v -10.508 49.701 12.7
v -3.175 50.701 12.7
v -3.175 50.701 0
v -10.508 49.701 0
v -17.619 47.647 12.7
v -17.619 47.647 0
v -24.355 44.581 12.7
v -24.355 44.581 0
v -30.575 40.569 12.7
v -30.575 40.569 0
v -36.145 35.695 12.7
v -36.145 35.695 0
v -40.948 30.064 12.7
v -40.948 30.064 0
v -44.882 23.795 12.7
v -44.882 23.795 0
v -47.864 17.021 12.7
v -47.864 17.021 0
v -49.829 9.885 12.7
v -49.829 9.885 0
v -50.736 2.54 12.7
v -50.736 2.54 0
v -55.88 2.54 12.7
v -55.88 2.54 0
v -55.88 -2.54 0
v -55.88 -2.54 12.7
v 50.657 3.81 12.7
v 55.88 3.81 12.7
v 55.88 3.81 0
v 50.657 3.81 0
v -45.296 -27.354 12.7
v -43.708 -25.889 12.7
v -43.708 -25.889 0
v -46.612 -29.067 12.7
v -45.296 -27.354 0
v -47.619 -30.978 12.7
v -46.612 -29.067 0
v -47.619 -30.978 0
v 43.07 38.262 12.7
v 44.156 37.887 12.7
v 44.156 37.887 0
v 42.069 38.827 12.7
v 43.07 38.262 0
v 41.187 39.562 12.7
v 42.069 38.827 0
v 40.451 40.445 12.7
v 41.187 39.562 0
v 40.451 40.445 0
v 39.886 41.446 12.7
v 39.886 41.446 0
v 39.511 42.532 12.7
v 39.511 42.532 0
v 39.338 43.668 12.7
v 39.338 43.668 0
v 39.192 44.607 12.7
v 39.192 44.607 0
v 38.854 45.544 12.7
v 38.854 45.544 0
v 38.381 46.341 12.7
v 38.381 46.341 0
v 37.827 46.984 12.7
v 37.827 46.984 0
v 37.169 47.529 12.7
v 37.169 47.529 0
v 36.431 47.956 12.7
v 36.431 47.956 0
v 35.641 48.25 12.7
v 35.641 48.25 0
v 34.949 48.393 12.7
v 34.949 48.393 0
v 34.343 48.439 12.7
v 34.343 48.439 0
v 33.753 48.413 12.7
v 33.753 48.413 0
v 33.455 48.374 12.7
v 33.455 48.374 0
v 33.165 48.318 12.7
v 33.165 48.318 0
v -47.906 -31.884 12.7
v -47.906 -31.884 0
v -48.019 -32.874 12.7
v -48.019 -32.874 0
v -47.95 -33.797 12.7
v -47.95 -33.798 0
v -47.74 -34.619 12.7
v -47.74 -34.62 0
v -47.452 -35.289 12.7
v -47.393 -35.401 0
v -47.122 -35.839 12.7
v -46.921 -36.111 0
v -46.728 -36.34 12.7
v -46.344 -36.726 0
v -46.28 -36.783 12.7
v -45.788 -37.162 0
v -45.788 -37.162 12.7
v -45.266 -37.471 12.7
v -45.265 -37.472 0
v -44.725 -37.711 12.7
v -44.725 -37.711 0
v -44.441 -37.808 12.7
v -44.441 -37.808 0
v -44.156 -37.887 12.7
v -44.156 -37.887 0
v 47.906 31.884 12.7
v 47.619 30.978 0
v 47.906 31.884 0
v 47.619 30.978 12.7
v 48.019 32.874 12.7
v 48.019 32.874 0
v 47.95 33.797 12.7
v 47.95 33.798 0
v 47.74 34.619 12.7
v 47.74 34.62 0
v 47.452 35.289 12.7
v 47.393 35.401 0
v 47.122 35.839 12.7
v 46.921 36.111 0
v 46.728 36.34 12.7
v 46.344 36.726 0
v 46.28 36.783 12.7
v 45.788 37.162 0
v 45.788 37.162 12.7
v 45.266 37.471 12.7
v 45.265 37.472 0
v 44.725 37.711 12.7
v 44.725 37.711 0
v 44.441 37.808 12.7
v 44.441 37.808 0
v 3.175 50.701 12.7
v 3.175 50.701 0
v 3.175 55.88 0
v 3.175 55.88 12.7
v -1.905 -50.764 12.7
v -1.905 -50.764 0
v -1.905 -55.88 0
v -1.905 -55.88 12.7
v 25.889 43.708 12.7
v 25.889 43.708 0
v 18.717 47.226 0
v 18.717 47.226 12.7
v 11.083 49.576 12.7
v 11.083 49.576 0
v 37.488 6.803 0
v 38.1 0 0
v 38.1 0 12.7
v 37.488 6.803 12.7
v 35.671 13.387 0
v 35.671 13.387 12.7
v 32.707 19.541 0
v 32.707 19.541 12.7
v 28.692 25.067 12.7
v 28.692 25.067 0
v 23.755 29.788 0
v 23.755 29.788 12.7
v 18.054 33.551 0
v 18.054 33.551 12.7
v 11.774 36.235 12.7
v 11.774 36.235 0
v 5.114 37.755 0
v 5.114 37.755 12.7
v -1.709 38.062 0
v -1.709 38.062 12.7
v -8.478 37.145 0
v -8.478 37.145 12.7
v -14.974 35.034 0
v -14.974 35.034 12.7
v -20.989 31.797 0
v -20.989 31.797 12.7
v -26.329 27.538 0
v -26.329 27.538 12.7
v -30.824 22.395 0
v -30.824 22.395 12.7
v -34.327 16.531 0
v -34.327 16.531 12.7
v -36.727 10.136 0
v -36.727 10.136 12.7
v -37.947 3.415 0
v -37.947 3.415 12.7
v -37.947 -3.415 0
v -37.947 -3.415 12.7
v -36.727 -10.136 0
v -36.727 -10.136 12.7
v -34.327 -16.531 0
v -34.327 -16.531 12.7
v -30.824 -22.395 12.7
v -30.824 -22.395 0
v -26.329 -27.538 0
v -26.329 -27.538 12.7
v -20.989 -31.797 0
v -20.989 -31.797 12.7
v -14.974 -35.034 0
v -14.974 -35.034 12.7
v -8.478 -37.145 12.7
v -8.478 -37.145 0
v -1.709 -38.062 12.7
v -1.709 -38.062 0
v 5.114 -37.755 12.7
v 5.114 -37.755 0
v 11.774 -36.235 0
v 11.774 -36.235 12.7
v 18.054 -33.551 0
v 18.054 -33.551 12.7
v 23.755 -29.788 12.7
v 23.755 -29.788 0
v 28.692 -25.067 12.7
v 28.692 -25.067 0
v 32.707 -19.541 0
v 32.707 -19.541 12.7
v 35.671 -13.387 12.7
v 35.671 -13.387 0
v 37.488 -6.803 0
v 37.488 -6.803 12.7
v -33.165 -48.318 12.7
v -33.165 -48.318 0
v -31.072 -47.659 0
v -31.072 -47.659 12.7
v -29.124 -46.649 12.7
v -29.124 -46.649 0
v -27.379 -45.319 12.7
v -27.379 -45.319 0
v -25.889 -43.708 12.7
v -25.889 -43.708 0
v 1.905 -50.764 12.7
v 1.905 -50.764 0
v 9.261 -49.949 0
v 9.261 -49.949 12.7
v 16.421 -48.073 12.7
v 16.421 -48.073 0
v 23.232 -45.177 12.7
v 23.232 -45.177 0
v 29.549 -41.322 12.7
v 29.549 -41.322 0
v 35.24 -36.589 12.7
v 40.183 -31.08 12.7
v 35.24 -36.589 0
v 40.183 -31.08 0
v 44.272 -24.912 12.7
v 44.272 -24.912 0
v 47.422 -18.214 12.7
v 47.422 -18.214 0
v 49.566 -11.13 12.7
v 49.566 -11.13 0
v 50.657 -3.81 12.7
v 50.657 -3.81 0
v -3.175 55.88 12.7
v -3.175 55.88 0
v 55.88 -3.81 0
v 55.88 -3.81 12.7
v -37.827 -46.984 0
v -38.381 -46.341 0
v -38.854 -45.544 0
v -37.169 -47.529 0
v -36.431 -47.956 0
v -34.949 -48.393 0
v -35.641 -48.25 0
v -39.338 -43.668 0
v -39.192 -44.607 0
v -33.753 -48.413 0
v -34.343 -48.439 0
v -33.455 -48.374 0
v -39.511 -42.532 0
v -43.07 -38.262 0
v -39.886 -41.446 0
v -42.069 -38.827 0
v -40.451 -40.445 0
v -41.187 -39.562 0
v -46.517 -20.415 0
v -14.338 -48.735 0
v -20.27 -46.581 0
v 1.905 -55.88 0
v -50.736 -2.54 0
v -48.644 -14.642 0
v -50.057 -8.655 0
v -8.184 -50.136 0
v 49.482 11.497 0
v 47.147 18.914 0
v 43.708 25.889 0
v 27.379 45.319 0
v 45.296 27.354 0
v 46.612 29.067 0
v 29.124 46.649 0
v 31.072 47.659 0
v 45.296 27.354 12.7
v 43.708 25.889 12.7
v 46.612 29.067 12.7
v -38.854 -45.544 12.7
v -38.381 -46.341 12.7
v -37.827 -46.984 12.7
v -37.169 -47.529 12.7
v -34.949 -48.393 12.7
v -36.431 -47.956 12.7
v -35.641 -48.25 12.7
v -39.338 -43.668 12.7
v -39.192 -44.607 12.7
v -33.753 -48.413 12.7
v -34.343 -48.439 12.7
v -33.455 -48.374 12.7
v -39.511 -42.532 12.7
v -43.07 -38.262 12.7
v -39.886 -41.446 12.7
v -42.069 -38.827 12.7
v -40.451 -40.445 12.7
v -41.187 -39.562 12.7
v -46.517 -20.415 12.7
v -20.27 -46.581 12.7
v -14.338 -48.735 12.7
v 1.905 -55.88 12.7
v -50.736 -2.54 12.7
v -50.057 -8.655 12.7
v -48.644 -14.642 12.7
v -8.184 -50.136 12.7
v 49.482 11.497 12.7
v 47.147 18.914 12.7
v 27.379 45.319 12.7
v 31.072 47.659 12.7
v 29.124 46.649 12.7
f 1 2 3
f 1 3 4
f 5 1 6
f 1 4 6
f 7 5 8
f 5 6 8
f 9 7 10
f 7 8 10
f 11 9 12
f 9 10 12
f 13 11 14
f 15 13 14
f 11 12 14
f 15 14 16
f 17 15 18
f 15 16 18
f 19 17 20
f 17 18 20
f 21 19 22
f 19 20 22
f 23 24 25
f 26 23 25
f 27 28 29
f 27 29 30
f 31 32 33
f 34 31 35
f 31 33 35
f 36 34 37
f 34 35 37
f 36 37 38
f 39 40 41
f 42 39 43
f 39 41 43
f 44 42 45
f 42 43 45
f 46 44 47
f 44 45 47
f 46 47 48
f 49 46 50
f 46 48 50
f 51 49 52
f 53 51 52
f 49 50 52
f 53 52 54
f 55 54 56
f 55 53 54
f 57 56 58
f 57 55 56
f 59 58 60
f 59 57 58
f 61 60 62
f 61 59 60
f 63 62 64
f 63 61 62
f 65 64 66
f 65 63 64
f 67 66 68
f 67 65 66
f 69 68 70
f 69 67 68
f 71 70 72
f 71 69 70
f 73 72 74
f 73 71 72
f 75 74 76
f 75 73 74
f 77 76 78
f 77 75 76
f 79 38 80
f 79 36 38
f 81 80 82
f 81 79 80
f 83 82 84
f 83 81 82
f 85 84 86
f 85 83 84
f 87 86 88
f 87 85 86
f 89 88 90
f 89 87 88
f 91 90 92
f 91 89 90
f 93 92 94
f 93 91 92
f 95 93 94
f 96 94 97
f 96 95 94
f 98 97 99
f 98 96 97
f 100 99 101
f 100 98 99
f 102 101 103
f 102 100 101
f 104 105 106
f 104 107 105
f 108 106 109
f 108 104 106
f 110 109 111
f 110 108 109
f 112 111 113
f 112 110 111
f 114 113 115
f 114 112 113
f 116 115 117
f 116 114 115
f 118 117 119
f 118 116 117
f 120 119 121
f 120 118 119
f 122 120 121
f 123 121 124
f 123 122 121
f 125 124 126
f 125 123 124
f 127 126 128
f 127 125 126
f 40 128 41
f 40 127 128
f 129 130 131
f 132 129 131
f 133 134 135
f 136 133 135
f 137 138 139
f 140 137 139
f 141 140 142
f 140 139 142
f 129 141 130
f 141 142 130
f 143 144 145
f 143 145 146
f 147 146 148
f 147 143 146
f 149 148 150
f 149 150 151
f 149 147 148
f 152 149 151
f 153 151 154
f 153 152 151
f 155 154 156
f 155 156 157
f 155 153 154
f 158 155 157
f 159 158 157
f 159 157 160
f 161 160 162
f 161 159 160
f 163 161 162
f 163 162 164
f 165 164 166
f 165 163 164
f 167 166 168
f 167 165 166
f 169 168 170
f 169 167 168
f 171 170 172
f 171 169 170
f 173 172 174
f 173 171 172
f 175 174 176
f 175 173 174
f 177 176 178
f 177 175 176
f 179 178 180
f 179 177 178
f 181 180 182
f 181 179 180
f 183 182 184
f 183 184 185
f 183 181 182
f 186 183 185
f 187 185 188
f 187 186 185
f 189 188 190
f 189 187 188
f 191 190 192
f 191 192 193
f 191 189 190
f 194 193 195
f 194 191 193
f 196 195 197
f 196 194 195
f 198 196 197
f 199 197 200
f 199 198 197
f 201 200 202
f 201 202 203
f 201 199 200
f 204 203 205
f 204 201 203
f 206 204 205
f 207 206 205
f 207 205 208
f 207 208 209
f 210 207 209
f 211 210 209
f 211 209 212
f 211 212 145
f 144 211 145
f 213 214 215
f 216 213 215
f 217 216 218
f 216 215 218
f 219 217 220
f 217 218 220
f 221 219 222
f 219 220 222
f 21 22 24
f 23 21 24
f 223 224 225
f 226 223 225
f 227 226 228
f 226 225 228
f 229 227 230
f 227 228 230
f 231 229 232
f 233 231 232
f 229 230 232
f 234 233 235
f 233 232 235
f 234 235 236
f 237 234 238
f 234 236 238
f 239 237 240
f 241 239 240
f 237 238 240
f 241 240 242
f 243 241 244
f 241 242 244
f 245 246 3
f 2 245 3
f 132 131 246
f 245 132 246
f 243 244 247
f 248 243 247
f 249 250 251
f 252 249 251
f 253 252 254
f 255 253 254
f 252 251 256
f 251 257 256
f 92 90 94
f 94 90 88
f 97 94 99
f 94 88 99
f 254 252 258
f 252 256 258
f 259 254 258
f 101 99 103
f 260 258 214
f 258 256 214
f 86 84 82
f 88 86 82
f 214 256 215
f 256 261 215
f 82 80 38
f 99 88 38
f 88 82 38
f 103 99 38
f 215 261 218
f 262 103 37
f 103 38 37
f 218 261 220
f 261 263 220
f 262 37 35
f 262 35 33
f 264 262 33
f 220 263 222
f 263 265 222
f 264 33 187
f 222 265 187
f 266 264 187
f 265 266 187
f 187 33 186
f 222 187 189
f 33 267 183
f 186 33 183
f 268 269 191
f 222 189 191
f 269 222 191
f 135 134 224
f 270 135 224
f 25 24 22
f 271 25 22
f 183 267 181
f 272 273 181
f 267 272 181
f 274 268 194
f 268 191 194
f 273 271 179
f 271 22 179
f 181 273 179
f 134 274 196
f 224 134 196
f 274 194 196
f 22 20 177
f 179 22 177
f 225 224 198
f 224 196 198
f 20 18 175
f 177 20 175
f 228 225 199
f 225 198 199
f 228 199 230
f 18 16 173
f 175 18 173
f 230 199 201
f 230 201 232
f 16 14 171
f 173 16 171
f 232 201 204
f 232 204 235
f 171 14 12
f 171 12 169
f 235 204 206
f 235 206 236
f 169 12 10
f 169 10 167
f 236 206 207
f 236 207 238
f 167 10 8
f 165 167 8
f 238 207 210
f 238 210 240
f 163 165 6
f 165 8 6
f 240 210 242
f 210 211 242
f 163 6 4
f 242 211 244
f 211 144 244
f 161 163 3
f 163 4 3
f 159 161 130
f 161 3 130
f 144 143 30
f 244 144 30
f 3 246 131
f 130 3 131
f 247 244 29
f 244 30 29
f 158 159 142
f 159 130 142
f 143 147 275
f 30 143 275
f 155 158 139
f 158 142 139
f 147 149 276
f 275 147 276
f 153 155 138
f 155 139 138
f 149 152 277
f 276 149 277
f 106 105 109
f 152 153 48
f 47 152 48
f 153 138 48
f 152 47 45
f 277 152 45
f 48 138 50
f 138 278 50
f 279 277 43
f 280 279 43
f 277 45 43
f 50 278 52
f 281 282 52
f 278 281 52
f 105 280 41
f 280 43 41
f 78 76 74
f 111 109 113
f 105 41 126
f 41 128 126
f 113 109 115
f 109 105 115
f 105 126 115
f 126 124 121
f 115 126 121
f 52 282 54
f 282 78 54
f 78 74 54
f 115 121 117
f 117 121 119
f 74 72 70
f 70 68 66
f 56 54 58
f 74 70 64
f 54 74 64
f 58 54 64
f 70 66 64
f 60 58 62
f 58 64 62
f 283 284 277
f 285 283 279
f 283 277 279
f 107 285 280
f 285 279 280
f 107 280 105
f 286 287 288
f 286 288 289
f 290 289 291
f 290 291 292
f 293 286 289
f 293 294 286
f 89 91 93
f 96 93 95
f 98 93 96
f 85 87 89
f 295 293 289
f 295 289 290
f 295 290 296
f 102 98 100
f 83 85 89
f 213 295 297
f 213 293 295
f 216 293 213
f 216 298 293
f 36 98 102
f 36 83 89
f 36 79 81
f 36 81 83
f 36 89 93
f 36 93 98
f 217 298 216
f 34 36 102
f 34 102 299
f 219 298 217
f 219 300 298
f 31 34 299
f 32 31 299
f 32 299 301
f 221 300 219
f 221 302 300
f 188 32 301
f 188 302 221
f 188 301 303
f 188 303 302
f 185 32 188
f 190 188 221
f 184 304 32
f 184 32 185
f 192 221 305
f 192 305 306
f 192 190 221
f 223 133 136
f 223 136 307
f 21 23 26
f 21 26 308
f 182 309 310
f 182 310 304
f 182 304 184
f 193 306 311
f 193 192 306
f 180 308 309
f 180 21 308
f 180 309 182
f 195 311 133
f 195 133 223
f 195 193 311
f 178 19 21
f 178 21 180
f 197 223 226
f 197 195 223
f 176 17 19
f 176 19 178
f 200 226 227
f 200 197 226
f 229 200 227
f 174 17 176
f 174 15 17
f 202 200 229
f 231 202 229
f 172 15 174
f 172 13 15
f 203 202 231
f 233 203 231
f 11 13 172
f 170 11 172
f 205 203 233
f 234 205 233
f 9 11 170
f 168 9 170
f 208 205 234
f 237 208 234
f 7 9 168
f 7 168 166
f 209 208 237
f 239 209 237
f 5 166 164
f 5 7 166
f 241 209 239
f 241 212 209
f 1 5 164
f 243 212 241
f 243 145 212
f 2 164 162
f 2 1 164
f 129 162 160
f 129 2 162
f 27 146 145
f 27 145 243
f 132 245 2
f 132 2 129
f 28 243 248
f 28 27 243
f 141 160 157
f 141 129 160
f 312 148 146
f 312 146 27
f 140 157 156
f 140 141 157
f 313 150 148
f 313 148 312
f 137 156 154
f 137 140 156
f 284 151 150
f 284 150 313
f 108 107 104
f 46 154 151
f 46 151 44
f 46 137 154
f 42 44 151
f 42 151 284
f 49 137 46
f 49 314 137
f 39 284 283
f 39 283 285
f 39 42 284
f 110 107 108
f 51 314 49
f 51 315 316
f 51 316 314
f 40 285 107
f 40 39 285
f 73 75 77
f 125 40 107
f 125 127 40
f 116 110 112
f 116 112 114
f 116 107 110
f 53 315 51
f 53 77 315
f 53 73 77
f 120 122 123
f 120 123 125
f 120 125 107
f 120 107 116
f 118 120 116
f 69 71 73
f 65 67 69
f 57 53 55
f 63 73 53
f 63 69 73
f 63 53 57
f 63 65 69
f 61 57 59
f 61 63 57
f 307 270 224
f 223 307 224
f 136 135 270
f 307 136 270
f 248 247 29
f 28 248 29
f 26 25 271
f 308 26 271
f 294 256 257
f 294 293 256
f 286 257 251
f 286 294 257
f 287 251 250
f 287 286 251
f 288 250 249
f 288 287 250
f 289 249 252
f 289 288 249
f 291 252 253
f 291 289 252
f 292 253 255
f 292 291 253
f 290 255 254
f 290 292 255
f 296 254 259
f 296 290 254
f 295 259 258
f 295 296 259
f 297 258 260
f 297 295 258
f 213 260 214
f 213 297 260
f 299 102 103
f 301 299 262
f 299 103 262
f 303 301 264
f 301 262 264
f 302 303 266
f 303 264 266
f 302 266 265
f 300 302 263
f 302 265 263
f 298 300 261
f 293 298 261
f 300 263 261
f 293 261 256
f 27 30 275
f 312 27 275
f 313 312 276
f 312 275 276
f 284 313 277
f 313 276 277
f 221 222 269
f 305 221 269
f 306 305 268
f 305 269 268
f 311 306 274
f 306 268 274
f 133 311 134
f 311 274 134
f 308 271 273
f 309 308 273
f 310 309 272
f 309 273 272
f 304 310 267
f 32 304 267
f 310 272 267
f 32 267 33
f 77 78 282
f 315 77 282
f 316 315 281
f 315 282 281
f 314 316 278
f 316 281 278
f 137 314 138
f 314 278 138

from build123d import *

# Parameters (mm, degrees)
F0_R     = 38.1
F1_DEPTH = 12.7
F2_R     = 5.08


with BuildPart() as f1:
    # F0 (on Top) → F1 (new body)
    with BuildSketch(Plane.XY):
        with BuildLine():
            ThreePointArc((50.656924, -3.81), (50.764218, -1.906343), (50.8, 0))
            ThreePointArc((50.8, 0), (50.764218, 1.906343), (50.656924, 3.81))
            ThreePointArc((50.656924, 3.81), (48.456851, 15.250362), (43.708314, 25.888671))
            ThreePointArc((43.708314, 25.888671), (35.921024, 35.921024), (25.888671, 43.708314))
            ThreePointArc((25.888671, 43.708314), (14.94649, 48.551441), (3.175, 50.700684))
            ThreePointArc((3.175, 50.700684), (0, 50.8), (-3.175, 50.700684))
            ThreePointArc((-3.175, 50.700684), (-36.145183, 35.695458), (-50.73646, 2.54))
            ThreePointArc((-50.73646, 2.54), (-50.8, 0), (-50.73646, -2.54))
            ThreePointArc((-50.73646, -2.54), (-48.644054, -14.642269), (-43.708314, -25.888671))
            ThreePointArc((-43.708314, -25.888671), (-35.921024, -35.921024), (-25.888671, -43.708314))
            ThreePointArc((-25.888671, -43.708314), (-14.337666, -48.734704), (-1.905, -50.764269))
            ThreePointArc((-1.905, -50.764269), (0, -50.8), (1.905, -50.764269))
            ThreePointArc((1.905, -50.764269), (35.240102, -36.589277), (50.656924, -3.81))
        make_face()
        Circle(F0_R, mode=Mode.SUBTRACT)
        with BuildLine():
            ThreePointArc((50.656924, 3.81), (50.764218, 1.906343), (50.8, 0))
            ThreePointArc((50.8, 0), (50.764218, -1.906343), (50.656924, -3.81))
            Line((50.656924, -3.81), (55.88, -3.81))
            Line((55.88, -3.81), (55.88, 3.81))
            Line((55.88, 3.81), (50.656924, 3.81))
        make_face()
        with BuildLine():
            ThreePointArc((25.888671, 43.708314), (35.921024, 35.921024), (43.708314, 25.888671))
            ThreePointArc((43.708314, 25.888671), (47.804199, 31.439935), (48.393645, 38.31346))
            ThreePointArc((48.393645, 38.31346), (40.798679, 39.986856), (40.520196, 47.758998))
            ThreePointArc((40.520196, 47.758998), (32.532533, 48.160637), (25.888671, 43.708314))
        make_face()
        with BuildLine():
            Line((1.905, -55.88), (1.905, -50.764269))
            ThreePointArc((1.905, -50.764269), (0, -50.8), (-1.905, -50.764269))
            Line((-1.905, -50.764269), (-1.905, -55.88))
            Line((-1.905, -55.88), (1.905, -55.88))
        make_face()
        with BuildLine():
            ThreePointArc((-3.175, 50.700684), (0, 50.8), (3.175, 50.700684))
            Line((3.175, 50.700684), (3.175, 55.88))
            Line((3.175, 55.88), (-3.175, 55.88))
            Line((-3.175, 55.88), (-3.175, 50.700684))
        make_face()
        with BuildLine():
            ThreePointArc((-40.520196, -47.758998), (-32.532533, -48.160637), (-25.888671, -43.708314))
            ThreePointArc((-25.888671, -43.708314), (-35.921024, -35.921024), (-43.708314, -25.888671))
            ThreePointArc((-43.708314, -25.888671), (-47.804199, -31.439935), (-48.393645, -38.31346))
            ThreePointArc((-48.393645, -38.31346), (-40.798679, -39.986856), (-40.520196, -47.758998))
        make_face()
        with BuildLine():
            ThreePointArc((-50.73646, -2.54), (-50.8, 0), (-50.73646, 2.54))
            Line((-50.73646, 2.54), (-55.88, 2.54))
            Line((-55.88, 2.54), (-55.88, -2.54))
            Line((-55.88, -2.54), (-50.73646, -2.54))
        make_face()
    extrude(amount=F1_DEPTH)

    # F2
    f2_edges = [f1.edges().sort_by_distance(p)[0] for p in [
        (-48.393645, -38.31346, 6.35),
        (-40.520196, -47.758998, 6.35),
        (40.520196, 47.758998, 6.35),
        (48.393645, 38.31346, 6.35),
    ]]
    fillet(f2_edges, radius=F2_R)


solid = f1.part
